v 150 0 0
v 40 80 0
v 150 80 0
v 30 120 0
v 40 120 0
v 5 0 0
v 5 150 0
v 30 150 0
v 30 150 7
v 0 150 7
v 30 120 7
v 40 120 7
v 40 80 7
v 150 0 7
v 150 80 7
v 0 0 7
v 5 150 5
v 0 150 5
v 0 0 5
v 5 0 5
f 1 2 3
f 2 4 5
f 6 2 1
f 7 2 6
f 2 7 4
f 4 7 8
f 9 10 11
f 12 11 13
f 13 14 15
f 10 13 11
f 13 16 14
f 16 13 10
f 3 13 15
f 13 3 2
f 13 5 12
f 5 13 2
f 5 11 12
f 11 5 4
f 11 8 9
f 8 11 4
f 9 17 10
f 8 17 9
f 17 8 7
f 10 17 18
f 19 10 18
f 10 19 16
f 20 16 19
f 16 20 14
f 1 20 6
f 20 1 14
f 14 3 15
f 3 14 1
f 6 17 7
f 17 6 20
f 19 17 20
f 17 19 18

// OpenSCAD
difference() {

linear_extrude( height=7) polygon(points = [
    [0, 0], 
    [150,0],
    [150,80],
    [40,80],
    [40,120],
    [30,120],
    [30,150],
    [0,150],
    [0,0]
]);

cube([10,400,10], center=true);
}
